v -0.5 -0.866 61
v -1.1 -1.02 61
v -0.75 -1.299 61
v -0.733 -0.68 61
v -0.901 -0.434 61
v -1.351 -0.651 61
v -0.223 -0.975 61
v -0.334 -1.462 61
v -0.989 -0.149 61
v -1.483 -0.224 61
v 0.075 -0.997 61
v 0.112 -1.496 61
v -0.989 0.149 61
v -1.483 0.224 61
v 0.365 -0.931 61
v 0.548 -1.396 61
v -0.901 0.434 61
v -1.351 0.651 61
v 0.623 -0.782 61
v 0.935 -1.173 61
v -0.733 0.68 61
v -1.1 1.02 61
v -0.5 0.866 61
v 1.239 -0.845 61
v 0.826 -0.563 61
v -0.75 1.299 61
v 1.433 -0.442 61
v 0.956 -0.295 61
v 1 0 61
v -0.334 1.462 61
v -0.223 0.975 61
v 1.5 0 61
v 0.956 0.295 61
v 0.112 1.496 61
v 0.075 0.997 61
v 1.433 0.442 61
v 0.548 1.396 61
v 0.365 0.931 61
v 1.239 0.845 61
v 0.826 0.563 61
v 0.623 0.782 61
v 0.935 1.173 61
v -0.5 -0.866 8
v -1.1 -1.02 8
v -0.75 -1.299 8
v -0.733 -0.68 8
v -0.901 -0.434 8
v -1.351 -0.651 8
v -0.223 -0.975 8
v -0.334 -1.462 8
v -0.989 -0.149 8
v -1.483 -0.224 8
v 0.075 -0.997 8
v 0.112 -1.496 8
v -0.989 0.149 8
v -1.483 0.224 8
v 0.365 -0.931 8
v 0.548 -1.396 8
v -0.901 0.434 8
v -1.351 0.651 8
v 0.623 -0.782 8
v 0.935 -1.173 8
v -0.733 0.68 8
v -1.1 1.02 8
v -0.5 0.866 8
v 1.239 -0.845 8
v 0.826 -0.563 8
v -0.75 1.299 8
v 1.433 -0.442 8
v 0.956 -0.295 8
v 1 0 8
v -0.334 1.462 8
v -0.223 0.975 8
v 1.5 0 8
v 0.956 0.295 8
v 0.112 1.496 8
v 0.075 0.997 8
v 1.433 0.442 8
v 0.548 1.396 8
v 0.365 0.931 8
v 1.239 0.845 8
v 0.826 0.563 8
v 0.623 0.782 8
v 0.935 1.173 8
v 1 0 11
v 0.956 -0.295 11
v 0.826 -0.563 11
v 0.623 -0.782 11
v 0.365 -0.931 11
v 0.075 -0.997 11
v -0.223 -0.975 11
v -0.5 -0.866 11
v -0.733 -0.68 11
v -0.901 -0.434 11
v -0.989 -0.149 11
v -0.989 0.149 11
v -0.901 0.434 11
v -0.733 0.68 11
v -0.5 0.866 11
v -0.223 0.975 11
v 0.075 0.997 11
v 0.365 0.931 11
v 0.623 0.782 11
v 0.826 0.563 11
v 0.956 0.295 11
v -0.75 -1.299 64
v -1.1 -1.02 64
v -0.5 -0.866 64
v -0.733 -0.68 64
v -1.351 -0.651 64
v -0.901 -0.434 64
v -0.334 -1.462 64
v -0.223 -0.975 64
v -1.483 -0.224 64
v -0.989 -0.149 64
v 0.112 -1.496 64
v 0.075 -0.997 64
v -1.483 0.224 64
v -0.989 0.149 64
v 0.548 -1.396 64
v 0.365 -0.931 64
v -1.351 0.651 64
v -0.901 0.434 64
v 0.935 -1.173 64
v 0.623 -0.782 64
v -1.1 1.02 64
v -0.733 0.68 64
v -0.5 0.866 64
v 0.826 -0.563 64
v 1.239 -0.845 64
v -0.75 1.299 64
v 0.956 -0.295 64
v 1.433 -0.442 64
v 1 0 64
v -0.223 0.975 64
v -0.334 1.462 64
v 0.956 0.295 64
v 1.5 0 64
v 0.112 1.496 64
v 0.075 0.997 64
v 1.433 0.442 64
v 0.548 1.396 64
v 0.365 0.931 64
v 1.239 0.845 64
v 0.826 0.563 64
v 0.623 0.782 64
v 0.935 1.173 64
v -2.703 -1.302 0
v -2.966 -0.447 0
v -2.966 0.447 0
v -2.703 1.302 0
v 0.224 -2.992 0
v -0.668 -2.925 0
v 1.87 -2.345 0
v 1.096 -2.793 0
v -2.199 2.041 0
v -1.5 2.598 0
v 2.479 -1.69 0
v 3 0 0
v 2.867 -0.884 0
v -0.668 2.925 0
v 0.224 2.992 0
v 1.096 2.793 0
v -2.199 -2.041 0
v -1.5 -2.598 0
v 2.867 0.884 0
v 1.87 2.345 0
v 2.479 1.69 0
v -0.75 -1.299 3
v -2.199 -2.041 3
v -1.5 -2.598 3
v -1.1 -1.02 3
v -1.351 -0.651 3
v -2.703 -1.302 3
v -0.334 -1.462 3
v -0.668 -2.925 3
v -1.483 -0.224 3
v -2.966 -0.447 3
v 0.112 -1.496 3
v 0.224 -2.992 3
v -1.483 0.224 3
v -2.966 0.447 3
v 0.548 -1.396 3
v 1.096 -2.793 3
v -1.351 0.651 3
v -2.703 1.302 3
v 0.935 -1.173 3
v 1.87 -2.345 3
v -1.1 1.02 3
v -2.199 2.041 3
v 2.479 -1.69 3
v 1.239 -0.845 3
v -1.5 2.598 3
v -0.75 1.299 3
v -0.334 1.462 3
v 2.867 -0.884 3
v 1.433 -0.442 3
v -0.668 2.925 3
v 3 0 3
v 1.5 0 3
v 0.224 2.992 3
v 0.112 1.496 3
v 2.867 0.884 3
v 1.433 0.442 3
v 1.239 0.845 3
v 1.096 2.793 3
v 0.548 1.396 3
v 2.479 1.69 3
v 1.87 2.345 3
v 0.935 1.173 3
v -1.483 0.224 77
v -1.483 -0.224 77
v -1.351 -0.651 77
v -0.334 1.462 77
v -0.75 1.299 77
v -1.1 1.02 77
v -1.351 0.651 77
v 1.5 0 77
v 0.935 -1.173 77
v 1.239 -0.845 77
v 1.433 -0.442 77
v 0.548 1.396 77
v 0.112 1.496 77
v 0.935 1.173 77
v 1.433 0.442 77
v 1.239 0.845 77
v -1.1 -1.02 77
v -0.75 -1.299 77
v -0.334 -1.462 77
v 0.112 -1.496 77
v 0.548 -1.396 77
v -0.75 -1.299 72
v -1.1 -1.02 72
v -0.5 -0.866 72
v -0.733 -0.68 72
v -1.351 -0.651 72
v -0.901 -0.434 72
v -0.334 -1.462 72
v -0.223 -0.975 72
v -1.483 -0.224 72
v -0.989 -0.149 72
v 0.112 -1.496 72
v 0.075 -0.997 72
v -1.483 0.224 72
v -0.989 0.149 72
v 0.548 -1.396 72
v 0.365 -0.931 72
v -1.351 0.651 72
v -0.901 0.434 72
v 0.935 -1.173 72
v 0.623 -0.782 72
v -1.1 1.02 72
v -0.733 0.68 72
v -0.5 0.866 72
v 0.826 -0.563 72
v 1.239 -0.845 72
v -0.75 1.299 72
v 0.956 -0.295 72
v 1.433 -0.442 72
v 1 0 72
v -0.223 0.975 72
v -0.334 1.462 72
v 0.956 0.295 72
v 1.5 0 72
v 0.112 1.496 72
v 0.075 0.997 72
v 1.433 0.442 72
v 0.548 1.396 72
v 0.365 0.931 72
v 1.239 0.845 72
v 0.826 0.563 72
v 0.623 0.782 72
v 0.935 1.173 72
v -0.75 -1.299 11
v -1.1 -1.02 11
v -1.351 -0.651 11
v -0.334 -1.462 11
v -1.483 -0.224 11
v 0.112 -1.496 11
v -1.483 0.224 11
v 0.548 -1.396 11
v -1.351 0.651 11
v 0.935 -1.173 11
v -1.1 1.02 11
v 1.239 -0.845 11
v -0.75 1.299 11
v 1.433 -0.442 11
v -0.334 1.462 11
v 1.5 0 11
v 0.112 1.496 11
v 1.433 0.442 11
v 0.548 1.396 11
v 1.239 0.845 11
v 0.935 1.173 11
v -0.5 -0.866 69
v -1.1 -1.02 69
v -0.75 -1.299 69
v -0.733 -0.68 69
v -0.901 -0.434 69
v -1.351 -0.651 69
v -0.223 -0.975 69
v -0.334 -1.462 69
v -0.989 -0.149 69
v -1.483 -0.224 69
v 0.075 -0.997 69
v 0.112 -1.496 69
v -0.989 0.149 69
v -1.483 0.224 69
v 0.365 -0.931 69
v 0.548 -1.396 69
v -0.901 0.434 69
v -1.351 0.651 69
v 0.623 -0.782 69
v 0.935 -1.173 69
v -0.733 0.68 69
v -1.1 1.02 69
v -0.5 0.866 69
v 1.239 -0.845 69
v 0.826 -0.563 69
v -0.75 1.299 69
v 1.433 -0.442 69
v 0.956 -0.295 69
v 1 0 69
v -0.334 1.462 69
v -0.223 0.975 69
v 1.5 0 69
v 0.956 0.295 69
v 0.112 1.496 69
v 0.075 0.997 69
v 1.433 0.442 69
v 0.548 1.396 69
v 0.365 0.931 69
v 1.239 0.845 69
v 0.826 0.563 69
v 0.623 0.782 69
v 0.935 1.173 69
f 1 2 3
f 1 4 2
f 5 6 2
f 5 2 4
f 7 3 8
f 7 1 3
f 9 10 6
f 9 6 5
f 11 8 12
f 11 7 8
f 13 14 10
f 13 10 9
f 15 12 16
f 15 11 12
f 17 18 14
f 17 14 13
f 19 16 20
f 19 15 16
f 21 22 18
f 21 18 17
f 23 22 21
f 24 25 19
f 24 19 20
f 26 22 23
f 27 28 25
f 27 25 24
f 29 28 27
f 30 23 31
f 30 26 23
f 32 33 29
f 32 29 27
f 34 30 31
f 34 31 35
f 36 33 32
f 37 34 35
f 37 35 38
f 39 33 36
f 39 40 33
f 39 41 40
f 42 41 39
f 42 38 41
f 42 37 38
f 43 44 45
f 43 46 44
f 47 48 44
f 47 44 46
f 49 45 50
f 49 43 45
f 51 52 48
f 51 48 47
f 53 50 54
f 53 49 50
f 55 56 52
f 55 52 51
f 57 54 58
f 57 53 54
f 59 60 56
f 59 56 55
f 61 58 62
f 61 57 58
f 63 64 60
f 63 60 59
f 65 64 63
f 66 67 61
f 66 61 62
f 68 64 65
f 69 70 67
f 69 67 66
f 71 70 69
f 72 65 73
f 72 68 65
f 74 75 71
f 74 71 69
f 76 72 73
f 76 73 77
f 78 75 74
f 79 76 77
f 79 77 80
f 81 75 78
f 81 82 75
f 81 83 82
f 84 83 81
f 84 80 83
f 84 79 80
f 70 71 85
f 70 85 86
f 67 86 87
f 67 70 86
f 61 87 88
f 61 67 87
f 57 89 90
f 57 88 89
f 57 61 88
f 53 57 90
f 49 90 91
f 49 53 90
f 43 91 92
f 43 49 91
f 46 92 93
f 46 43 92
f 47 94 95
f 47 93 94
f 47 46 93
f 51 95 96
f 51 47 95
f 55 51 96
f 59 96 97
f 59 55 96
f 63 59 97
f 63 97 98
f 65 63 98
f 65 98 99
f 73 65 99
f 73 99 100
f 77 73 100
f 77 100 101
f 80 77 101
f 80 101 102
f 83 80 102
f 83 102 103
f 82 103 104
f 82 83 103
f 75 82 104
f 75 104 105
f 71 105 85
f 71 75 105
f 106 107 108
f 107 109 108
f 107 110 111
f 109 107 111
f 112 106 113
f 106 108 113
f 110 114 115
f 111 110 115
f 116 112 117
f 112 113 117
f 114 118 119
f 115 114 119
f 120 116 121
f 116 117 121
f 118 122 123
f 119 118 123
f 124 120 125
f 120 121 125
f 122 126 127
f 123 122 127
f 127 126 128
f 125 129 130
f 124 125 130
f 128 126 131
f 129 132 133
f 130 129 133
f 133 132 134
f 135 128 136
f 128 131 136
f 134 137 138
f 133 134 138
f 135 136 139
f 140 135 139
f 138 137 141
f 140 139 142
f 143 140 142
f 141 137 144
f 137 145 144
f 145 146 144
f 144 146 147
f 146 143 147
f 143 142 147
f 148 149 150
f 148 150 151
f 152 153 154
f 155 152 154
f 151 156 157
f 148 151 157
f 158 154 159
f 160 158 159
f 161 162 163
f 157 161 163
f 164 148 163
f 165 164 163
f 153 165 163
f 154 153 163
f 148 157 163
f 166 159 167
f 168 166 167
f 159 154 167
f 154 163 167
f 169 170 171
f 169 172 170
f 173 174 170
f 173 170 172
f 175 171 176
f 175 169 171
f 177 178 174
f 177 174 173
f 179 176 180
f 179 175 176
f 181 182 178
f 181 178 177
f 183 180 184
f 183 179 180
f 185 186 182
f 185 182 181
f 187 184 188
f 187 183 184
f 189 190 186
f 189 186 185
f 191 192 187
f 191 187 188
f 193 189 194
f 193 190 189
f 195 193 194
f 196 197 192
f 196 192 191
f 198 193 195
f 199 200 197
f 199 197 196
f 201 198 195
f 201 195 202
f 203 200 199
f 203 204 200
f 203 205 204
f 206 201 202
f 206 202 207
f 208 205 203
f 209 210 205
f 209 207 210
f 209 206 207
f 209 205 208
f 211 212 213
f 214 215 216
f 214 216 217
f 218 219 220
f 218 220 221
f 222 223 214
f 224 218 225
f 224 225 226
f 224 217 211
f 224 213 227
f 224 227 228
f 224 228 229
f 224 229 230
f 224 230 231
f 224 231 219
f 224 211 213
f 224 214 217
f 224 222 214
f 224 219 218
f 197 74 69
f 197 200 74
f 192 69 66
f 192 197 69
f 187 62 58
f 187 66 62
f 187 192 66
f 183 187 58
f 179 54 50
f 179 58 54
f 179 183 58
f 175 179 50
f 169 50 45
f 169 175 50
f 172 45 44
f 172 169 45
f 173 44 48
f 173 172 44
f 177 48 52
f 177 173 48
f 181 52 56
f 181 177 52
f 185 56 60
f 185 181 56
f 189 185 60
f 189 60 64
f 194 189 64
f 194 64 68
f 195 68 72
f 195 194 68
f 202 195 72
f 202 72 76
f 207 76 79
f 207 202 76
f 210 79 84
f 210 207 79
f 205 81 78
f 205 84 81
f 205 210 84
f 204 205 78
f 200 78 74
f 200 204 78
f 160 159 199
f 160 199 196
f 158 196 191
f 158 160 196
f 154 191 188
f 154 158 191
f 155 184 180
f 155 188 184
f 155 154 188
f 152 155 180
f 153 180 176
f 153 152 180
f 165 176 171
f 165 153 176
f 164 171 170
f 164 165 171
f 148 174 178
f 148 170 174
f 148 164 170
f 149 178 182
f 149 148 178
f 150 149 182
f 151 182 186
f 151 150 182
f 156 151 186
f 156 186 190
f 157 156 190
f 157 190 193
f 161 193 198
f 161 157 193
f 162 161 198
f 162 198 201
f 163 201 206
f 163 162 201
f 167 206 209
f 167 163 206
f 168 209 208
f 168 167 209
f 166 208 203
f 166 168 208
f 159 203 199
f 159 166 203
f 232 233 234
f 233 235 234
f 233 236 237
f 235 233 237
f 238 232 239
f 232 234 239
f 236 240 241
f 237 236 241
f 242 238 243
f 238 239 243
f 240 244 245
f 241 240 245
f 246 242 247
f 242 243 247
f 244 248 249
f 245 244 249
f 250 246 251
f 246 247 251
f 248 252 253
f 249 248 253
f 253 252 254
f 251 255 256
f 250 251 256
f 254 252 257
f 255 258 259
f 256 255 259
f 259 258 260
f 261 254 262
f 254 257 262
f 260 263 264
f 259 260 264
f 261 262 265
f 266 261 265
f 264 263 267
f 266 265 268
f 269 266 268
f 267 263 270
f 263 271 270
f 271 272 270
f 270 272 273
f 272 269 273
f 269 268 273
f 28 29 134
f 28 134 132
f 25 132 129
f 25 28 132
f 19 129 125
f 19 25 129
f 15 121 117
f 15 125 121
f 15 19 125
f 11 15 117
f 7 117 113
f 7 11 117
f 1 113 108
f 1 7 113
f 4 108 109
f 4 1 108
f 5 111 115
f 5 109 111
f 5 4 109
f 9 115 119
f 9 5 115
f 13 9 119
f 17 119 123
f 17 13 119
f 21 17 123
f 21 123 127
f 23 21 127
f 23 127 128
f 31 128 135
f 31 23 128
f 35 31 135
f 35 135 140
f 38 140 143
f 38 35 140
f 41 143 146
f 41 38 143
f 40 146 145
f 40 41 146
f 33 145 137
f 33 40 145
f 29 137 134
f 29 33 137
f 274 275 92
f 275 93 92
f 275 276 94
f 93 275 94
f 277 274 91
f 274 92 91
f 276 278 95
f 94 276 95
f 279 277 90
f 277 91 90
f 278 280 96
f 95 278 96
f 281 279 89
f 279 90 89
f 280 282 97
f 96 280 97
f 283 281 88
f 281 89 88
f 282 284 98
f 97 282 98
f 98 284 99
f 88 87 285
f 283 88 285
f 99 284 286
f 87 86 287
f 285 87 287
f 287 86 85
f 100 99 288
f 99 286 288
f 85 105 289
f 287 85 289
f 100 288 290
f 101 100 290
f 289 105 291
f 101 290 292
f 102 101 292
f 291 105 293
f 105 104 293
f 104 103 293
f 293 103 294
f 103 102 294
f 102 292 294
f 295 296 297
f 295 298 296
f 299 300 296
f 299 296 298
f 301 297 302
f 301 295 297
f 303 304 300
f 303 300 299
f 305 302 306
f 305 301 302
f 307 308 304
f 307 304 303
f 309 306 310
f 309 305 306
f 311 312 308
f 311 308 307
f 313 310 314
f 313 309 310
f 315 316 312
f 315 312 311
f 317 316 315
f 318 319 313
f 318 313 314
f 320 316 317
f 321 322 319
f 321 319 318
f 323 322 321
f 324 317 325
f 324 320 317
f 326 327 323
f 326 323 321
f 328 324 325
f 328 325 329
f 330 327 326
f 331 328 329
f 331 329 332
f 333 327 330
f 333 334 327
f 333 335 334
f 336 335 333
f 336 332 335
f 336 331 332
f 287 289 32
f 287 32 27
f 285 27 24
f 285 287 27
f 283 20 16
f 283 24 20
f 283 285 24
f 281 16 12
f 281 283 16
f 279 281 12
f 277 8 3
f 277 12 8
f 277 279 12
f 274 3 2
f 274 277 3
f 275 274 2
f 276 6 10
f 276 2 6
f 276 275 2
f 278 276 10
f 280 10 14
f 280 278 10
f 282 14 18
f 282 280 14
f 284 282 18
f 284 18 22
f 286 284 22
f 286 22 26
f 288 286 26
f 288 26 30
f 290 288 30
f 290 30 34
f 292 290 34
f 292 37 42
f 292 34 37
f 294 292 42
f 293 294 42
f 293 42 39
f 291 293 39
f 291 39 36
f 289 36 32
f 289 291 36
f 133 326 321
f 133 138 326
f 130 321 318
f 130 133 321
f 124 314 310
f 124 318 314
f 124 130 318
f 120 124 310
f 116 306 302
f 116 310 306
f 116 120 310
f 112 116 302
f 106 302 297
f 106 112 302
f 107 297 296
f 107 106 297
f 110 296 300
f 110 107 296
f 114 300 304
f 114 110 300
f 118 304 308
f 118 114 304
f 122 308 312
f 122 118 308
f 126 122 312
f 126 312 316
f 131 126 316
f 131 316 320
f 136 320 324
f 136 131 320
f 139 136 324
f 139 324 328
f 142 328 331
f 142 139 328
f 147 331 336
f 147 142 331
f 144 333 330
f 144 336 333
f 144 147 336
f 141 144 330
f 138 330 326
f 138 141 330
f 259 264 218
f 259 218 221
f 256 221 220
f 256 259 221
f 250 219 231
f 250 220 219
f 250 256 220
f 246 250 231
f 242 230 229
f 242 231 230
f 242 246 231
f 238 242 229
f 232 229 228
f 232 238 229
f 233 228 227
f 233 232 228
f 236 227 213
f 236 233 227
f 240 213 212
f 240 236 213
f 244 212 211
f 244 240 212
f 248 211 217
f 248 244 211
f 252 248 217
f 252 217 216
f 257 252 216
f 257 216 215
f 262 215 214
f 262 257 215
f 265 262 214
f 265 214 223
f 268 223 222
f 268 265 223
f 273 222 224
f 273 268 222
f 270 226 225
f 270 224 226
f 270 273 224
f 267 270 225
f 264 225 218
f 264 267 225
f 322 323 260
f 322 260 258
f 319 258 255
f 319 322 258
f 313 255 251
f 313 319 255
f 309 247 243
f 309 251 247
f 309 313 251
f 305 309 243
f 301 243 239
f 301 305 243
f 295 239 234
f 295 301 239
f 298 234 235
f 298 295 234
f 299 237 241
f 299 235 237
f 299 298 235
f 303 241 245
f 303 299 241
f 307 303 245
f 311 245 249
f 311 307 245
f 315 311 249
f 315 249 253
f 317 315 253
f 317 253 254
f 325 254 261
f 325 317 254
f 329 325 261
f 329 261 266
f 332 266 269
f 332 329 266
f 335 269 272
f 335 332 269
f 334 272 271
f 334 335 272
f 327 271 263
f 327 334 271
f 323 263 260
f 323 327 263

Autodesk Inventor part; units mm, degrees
ref_plane "YZ Plane" through (0, 0, 0) normal (1, 0, 0) x (0, 1, 0)
ref_plane "XZ Plane" through (0, 0, 0) normal (0, 1, 0) x (-1, 0, 0)
ref_plane "XY Plane" through (0, 0, 0) normal (0, 0, 1) x (1, 0, 0)
sketch "Sketch1" plane through (0, 0, 0) normal (0, 0, 1) x (1, 0, 0)
  circle A0 centre (0, 0) radius 3
  dimension "d0" = 6
extrude "Extrusion1" add sketch "Sketch1" along normal blind 3
sketch "Sketch5" plane through (0, 0, 3) normal (0, 0, 1) x (1, 0, 0)
  circle A0 centre (0, 0) radius 1.5
  dimension "d6" = 3
extrude "Extrusion3" add sketch "Sketch5" along normal blind 5
sketch "Sketch6" plane through (0, 0, 8) normal (0, 0, 1) x (1, 0, 0)
  circle A0 centre (0, 0) radius 1
  dimension "d9" = 2
extrude "Extrusion4" add sketch "Sketch6" along normal blind 3
sketch "Sketch7" plane through (0, 0, 11) normal (0, 0, 1) x (1, 0, 0)
  circle A0 centre (0, 0) radius 1 projected
  circle A1 centre (0, 0) radius 1.5
  dimension "d12" = 3
extrude "Extrusion5" add sketch "Sketch7" along normal blind 50 contours A0 | A1
sketch "Sketch8" plane through (0, 0, 61) normal (0, 0, 1) x (1, 0, 0)
  circle A0 centre (0, 0) radius 1
  dimension "d15" = 2
extrude "Extrusion6" add sketch "Sketch8" along normal blind 3
sketch "Sketch9" plane through (0, 0, 64) normal (0, 0, 1) x (1, 0, 0)
  circle A0 centre (0, 0) radius 1.5
  dimension "d18" = 3
extrude "Extrusion7" add sketch "Sketch9" along normal blind 5
sketch "Sketch10" plane through (0, 0, 69) normal (0, 0, 1) x (1, 0, 0)
  circle A0 centre (0, 0) radius 1 projected
  circle A1 centre (0, 0) radius 1
  dimension "d21" = 2
extrude "Extrusion8" add sketch "Sketch10" along normal blind 3
sketch "Sketch11" plane through (0, 0, 72) normal (0, 0, 1) x (1, 0, 0)
  circle A0 centre (0, 0) radius 1.5 projected
  circle A1 centre (0, 0) radius 1.5
  dimension "d24" = 3
extrude "Extrusion9" add sketch "Sketch11" along normal blind 5
properties part number "TornilloBasePixhawx"
